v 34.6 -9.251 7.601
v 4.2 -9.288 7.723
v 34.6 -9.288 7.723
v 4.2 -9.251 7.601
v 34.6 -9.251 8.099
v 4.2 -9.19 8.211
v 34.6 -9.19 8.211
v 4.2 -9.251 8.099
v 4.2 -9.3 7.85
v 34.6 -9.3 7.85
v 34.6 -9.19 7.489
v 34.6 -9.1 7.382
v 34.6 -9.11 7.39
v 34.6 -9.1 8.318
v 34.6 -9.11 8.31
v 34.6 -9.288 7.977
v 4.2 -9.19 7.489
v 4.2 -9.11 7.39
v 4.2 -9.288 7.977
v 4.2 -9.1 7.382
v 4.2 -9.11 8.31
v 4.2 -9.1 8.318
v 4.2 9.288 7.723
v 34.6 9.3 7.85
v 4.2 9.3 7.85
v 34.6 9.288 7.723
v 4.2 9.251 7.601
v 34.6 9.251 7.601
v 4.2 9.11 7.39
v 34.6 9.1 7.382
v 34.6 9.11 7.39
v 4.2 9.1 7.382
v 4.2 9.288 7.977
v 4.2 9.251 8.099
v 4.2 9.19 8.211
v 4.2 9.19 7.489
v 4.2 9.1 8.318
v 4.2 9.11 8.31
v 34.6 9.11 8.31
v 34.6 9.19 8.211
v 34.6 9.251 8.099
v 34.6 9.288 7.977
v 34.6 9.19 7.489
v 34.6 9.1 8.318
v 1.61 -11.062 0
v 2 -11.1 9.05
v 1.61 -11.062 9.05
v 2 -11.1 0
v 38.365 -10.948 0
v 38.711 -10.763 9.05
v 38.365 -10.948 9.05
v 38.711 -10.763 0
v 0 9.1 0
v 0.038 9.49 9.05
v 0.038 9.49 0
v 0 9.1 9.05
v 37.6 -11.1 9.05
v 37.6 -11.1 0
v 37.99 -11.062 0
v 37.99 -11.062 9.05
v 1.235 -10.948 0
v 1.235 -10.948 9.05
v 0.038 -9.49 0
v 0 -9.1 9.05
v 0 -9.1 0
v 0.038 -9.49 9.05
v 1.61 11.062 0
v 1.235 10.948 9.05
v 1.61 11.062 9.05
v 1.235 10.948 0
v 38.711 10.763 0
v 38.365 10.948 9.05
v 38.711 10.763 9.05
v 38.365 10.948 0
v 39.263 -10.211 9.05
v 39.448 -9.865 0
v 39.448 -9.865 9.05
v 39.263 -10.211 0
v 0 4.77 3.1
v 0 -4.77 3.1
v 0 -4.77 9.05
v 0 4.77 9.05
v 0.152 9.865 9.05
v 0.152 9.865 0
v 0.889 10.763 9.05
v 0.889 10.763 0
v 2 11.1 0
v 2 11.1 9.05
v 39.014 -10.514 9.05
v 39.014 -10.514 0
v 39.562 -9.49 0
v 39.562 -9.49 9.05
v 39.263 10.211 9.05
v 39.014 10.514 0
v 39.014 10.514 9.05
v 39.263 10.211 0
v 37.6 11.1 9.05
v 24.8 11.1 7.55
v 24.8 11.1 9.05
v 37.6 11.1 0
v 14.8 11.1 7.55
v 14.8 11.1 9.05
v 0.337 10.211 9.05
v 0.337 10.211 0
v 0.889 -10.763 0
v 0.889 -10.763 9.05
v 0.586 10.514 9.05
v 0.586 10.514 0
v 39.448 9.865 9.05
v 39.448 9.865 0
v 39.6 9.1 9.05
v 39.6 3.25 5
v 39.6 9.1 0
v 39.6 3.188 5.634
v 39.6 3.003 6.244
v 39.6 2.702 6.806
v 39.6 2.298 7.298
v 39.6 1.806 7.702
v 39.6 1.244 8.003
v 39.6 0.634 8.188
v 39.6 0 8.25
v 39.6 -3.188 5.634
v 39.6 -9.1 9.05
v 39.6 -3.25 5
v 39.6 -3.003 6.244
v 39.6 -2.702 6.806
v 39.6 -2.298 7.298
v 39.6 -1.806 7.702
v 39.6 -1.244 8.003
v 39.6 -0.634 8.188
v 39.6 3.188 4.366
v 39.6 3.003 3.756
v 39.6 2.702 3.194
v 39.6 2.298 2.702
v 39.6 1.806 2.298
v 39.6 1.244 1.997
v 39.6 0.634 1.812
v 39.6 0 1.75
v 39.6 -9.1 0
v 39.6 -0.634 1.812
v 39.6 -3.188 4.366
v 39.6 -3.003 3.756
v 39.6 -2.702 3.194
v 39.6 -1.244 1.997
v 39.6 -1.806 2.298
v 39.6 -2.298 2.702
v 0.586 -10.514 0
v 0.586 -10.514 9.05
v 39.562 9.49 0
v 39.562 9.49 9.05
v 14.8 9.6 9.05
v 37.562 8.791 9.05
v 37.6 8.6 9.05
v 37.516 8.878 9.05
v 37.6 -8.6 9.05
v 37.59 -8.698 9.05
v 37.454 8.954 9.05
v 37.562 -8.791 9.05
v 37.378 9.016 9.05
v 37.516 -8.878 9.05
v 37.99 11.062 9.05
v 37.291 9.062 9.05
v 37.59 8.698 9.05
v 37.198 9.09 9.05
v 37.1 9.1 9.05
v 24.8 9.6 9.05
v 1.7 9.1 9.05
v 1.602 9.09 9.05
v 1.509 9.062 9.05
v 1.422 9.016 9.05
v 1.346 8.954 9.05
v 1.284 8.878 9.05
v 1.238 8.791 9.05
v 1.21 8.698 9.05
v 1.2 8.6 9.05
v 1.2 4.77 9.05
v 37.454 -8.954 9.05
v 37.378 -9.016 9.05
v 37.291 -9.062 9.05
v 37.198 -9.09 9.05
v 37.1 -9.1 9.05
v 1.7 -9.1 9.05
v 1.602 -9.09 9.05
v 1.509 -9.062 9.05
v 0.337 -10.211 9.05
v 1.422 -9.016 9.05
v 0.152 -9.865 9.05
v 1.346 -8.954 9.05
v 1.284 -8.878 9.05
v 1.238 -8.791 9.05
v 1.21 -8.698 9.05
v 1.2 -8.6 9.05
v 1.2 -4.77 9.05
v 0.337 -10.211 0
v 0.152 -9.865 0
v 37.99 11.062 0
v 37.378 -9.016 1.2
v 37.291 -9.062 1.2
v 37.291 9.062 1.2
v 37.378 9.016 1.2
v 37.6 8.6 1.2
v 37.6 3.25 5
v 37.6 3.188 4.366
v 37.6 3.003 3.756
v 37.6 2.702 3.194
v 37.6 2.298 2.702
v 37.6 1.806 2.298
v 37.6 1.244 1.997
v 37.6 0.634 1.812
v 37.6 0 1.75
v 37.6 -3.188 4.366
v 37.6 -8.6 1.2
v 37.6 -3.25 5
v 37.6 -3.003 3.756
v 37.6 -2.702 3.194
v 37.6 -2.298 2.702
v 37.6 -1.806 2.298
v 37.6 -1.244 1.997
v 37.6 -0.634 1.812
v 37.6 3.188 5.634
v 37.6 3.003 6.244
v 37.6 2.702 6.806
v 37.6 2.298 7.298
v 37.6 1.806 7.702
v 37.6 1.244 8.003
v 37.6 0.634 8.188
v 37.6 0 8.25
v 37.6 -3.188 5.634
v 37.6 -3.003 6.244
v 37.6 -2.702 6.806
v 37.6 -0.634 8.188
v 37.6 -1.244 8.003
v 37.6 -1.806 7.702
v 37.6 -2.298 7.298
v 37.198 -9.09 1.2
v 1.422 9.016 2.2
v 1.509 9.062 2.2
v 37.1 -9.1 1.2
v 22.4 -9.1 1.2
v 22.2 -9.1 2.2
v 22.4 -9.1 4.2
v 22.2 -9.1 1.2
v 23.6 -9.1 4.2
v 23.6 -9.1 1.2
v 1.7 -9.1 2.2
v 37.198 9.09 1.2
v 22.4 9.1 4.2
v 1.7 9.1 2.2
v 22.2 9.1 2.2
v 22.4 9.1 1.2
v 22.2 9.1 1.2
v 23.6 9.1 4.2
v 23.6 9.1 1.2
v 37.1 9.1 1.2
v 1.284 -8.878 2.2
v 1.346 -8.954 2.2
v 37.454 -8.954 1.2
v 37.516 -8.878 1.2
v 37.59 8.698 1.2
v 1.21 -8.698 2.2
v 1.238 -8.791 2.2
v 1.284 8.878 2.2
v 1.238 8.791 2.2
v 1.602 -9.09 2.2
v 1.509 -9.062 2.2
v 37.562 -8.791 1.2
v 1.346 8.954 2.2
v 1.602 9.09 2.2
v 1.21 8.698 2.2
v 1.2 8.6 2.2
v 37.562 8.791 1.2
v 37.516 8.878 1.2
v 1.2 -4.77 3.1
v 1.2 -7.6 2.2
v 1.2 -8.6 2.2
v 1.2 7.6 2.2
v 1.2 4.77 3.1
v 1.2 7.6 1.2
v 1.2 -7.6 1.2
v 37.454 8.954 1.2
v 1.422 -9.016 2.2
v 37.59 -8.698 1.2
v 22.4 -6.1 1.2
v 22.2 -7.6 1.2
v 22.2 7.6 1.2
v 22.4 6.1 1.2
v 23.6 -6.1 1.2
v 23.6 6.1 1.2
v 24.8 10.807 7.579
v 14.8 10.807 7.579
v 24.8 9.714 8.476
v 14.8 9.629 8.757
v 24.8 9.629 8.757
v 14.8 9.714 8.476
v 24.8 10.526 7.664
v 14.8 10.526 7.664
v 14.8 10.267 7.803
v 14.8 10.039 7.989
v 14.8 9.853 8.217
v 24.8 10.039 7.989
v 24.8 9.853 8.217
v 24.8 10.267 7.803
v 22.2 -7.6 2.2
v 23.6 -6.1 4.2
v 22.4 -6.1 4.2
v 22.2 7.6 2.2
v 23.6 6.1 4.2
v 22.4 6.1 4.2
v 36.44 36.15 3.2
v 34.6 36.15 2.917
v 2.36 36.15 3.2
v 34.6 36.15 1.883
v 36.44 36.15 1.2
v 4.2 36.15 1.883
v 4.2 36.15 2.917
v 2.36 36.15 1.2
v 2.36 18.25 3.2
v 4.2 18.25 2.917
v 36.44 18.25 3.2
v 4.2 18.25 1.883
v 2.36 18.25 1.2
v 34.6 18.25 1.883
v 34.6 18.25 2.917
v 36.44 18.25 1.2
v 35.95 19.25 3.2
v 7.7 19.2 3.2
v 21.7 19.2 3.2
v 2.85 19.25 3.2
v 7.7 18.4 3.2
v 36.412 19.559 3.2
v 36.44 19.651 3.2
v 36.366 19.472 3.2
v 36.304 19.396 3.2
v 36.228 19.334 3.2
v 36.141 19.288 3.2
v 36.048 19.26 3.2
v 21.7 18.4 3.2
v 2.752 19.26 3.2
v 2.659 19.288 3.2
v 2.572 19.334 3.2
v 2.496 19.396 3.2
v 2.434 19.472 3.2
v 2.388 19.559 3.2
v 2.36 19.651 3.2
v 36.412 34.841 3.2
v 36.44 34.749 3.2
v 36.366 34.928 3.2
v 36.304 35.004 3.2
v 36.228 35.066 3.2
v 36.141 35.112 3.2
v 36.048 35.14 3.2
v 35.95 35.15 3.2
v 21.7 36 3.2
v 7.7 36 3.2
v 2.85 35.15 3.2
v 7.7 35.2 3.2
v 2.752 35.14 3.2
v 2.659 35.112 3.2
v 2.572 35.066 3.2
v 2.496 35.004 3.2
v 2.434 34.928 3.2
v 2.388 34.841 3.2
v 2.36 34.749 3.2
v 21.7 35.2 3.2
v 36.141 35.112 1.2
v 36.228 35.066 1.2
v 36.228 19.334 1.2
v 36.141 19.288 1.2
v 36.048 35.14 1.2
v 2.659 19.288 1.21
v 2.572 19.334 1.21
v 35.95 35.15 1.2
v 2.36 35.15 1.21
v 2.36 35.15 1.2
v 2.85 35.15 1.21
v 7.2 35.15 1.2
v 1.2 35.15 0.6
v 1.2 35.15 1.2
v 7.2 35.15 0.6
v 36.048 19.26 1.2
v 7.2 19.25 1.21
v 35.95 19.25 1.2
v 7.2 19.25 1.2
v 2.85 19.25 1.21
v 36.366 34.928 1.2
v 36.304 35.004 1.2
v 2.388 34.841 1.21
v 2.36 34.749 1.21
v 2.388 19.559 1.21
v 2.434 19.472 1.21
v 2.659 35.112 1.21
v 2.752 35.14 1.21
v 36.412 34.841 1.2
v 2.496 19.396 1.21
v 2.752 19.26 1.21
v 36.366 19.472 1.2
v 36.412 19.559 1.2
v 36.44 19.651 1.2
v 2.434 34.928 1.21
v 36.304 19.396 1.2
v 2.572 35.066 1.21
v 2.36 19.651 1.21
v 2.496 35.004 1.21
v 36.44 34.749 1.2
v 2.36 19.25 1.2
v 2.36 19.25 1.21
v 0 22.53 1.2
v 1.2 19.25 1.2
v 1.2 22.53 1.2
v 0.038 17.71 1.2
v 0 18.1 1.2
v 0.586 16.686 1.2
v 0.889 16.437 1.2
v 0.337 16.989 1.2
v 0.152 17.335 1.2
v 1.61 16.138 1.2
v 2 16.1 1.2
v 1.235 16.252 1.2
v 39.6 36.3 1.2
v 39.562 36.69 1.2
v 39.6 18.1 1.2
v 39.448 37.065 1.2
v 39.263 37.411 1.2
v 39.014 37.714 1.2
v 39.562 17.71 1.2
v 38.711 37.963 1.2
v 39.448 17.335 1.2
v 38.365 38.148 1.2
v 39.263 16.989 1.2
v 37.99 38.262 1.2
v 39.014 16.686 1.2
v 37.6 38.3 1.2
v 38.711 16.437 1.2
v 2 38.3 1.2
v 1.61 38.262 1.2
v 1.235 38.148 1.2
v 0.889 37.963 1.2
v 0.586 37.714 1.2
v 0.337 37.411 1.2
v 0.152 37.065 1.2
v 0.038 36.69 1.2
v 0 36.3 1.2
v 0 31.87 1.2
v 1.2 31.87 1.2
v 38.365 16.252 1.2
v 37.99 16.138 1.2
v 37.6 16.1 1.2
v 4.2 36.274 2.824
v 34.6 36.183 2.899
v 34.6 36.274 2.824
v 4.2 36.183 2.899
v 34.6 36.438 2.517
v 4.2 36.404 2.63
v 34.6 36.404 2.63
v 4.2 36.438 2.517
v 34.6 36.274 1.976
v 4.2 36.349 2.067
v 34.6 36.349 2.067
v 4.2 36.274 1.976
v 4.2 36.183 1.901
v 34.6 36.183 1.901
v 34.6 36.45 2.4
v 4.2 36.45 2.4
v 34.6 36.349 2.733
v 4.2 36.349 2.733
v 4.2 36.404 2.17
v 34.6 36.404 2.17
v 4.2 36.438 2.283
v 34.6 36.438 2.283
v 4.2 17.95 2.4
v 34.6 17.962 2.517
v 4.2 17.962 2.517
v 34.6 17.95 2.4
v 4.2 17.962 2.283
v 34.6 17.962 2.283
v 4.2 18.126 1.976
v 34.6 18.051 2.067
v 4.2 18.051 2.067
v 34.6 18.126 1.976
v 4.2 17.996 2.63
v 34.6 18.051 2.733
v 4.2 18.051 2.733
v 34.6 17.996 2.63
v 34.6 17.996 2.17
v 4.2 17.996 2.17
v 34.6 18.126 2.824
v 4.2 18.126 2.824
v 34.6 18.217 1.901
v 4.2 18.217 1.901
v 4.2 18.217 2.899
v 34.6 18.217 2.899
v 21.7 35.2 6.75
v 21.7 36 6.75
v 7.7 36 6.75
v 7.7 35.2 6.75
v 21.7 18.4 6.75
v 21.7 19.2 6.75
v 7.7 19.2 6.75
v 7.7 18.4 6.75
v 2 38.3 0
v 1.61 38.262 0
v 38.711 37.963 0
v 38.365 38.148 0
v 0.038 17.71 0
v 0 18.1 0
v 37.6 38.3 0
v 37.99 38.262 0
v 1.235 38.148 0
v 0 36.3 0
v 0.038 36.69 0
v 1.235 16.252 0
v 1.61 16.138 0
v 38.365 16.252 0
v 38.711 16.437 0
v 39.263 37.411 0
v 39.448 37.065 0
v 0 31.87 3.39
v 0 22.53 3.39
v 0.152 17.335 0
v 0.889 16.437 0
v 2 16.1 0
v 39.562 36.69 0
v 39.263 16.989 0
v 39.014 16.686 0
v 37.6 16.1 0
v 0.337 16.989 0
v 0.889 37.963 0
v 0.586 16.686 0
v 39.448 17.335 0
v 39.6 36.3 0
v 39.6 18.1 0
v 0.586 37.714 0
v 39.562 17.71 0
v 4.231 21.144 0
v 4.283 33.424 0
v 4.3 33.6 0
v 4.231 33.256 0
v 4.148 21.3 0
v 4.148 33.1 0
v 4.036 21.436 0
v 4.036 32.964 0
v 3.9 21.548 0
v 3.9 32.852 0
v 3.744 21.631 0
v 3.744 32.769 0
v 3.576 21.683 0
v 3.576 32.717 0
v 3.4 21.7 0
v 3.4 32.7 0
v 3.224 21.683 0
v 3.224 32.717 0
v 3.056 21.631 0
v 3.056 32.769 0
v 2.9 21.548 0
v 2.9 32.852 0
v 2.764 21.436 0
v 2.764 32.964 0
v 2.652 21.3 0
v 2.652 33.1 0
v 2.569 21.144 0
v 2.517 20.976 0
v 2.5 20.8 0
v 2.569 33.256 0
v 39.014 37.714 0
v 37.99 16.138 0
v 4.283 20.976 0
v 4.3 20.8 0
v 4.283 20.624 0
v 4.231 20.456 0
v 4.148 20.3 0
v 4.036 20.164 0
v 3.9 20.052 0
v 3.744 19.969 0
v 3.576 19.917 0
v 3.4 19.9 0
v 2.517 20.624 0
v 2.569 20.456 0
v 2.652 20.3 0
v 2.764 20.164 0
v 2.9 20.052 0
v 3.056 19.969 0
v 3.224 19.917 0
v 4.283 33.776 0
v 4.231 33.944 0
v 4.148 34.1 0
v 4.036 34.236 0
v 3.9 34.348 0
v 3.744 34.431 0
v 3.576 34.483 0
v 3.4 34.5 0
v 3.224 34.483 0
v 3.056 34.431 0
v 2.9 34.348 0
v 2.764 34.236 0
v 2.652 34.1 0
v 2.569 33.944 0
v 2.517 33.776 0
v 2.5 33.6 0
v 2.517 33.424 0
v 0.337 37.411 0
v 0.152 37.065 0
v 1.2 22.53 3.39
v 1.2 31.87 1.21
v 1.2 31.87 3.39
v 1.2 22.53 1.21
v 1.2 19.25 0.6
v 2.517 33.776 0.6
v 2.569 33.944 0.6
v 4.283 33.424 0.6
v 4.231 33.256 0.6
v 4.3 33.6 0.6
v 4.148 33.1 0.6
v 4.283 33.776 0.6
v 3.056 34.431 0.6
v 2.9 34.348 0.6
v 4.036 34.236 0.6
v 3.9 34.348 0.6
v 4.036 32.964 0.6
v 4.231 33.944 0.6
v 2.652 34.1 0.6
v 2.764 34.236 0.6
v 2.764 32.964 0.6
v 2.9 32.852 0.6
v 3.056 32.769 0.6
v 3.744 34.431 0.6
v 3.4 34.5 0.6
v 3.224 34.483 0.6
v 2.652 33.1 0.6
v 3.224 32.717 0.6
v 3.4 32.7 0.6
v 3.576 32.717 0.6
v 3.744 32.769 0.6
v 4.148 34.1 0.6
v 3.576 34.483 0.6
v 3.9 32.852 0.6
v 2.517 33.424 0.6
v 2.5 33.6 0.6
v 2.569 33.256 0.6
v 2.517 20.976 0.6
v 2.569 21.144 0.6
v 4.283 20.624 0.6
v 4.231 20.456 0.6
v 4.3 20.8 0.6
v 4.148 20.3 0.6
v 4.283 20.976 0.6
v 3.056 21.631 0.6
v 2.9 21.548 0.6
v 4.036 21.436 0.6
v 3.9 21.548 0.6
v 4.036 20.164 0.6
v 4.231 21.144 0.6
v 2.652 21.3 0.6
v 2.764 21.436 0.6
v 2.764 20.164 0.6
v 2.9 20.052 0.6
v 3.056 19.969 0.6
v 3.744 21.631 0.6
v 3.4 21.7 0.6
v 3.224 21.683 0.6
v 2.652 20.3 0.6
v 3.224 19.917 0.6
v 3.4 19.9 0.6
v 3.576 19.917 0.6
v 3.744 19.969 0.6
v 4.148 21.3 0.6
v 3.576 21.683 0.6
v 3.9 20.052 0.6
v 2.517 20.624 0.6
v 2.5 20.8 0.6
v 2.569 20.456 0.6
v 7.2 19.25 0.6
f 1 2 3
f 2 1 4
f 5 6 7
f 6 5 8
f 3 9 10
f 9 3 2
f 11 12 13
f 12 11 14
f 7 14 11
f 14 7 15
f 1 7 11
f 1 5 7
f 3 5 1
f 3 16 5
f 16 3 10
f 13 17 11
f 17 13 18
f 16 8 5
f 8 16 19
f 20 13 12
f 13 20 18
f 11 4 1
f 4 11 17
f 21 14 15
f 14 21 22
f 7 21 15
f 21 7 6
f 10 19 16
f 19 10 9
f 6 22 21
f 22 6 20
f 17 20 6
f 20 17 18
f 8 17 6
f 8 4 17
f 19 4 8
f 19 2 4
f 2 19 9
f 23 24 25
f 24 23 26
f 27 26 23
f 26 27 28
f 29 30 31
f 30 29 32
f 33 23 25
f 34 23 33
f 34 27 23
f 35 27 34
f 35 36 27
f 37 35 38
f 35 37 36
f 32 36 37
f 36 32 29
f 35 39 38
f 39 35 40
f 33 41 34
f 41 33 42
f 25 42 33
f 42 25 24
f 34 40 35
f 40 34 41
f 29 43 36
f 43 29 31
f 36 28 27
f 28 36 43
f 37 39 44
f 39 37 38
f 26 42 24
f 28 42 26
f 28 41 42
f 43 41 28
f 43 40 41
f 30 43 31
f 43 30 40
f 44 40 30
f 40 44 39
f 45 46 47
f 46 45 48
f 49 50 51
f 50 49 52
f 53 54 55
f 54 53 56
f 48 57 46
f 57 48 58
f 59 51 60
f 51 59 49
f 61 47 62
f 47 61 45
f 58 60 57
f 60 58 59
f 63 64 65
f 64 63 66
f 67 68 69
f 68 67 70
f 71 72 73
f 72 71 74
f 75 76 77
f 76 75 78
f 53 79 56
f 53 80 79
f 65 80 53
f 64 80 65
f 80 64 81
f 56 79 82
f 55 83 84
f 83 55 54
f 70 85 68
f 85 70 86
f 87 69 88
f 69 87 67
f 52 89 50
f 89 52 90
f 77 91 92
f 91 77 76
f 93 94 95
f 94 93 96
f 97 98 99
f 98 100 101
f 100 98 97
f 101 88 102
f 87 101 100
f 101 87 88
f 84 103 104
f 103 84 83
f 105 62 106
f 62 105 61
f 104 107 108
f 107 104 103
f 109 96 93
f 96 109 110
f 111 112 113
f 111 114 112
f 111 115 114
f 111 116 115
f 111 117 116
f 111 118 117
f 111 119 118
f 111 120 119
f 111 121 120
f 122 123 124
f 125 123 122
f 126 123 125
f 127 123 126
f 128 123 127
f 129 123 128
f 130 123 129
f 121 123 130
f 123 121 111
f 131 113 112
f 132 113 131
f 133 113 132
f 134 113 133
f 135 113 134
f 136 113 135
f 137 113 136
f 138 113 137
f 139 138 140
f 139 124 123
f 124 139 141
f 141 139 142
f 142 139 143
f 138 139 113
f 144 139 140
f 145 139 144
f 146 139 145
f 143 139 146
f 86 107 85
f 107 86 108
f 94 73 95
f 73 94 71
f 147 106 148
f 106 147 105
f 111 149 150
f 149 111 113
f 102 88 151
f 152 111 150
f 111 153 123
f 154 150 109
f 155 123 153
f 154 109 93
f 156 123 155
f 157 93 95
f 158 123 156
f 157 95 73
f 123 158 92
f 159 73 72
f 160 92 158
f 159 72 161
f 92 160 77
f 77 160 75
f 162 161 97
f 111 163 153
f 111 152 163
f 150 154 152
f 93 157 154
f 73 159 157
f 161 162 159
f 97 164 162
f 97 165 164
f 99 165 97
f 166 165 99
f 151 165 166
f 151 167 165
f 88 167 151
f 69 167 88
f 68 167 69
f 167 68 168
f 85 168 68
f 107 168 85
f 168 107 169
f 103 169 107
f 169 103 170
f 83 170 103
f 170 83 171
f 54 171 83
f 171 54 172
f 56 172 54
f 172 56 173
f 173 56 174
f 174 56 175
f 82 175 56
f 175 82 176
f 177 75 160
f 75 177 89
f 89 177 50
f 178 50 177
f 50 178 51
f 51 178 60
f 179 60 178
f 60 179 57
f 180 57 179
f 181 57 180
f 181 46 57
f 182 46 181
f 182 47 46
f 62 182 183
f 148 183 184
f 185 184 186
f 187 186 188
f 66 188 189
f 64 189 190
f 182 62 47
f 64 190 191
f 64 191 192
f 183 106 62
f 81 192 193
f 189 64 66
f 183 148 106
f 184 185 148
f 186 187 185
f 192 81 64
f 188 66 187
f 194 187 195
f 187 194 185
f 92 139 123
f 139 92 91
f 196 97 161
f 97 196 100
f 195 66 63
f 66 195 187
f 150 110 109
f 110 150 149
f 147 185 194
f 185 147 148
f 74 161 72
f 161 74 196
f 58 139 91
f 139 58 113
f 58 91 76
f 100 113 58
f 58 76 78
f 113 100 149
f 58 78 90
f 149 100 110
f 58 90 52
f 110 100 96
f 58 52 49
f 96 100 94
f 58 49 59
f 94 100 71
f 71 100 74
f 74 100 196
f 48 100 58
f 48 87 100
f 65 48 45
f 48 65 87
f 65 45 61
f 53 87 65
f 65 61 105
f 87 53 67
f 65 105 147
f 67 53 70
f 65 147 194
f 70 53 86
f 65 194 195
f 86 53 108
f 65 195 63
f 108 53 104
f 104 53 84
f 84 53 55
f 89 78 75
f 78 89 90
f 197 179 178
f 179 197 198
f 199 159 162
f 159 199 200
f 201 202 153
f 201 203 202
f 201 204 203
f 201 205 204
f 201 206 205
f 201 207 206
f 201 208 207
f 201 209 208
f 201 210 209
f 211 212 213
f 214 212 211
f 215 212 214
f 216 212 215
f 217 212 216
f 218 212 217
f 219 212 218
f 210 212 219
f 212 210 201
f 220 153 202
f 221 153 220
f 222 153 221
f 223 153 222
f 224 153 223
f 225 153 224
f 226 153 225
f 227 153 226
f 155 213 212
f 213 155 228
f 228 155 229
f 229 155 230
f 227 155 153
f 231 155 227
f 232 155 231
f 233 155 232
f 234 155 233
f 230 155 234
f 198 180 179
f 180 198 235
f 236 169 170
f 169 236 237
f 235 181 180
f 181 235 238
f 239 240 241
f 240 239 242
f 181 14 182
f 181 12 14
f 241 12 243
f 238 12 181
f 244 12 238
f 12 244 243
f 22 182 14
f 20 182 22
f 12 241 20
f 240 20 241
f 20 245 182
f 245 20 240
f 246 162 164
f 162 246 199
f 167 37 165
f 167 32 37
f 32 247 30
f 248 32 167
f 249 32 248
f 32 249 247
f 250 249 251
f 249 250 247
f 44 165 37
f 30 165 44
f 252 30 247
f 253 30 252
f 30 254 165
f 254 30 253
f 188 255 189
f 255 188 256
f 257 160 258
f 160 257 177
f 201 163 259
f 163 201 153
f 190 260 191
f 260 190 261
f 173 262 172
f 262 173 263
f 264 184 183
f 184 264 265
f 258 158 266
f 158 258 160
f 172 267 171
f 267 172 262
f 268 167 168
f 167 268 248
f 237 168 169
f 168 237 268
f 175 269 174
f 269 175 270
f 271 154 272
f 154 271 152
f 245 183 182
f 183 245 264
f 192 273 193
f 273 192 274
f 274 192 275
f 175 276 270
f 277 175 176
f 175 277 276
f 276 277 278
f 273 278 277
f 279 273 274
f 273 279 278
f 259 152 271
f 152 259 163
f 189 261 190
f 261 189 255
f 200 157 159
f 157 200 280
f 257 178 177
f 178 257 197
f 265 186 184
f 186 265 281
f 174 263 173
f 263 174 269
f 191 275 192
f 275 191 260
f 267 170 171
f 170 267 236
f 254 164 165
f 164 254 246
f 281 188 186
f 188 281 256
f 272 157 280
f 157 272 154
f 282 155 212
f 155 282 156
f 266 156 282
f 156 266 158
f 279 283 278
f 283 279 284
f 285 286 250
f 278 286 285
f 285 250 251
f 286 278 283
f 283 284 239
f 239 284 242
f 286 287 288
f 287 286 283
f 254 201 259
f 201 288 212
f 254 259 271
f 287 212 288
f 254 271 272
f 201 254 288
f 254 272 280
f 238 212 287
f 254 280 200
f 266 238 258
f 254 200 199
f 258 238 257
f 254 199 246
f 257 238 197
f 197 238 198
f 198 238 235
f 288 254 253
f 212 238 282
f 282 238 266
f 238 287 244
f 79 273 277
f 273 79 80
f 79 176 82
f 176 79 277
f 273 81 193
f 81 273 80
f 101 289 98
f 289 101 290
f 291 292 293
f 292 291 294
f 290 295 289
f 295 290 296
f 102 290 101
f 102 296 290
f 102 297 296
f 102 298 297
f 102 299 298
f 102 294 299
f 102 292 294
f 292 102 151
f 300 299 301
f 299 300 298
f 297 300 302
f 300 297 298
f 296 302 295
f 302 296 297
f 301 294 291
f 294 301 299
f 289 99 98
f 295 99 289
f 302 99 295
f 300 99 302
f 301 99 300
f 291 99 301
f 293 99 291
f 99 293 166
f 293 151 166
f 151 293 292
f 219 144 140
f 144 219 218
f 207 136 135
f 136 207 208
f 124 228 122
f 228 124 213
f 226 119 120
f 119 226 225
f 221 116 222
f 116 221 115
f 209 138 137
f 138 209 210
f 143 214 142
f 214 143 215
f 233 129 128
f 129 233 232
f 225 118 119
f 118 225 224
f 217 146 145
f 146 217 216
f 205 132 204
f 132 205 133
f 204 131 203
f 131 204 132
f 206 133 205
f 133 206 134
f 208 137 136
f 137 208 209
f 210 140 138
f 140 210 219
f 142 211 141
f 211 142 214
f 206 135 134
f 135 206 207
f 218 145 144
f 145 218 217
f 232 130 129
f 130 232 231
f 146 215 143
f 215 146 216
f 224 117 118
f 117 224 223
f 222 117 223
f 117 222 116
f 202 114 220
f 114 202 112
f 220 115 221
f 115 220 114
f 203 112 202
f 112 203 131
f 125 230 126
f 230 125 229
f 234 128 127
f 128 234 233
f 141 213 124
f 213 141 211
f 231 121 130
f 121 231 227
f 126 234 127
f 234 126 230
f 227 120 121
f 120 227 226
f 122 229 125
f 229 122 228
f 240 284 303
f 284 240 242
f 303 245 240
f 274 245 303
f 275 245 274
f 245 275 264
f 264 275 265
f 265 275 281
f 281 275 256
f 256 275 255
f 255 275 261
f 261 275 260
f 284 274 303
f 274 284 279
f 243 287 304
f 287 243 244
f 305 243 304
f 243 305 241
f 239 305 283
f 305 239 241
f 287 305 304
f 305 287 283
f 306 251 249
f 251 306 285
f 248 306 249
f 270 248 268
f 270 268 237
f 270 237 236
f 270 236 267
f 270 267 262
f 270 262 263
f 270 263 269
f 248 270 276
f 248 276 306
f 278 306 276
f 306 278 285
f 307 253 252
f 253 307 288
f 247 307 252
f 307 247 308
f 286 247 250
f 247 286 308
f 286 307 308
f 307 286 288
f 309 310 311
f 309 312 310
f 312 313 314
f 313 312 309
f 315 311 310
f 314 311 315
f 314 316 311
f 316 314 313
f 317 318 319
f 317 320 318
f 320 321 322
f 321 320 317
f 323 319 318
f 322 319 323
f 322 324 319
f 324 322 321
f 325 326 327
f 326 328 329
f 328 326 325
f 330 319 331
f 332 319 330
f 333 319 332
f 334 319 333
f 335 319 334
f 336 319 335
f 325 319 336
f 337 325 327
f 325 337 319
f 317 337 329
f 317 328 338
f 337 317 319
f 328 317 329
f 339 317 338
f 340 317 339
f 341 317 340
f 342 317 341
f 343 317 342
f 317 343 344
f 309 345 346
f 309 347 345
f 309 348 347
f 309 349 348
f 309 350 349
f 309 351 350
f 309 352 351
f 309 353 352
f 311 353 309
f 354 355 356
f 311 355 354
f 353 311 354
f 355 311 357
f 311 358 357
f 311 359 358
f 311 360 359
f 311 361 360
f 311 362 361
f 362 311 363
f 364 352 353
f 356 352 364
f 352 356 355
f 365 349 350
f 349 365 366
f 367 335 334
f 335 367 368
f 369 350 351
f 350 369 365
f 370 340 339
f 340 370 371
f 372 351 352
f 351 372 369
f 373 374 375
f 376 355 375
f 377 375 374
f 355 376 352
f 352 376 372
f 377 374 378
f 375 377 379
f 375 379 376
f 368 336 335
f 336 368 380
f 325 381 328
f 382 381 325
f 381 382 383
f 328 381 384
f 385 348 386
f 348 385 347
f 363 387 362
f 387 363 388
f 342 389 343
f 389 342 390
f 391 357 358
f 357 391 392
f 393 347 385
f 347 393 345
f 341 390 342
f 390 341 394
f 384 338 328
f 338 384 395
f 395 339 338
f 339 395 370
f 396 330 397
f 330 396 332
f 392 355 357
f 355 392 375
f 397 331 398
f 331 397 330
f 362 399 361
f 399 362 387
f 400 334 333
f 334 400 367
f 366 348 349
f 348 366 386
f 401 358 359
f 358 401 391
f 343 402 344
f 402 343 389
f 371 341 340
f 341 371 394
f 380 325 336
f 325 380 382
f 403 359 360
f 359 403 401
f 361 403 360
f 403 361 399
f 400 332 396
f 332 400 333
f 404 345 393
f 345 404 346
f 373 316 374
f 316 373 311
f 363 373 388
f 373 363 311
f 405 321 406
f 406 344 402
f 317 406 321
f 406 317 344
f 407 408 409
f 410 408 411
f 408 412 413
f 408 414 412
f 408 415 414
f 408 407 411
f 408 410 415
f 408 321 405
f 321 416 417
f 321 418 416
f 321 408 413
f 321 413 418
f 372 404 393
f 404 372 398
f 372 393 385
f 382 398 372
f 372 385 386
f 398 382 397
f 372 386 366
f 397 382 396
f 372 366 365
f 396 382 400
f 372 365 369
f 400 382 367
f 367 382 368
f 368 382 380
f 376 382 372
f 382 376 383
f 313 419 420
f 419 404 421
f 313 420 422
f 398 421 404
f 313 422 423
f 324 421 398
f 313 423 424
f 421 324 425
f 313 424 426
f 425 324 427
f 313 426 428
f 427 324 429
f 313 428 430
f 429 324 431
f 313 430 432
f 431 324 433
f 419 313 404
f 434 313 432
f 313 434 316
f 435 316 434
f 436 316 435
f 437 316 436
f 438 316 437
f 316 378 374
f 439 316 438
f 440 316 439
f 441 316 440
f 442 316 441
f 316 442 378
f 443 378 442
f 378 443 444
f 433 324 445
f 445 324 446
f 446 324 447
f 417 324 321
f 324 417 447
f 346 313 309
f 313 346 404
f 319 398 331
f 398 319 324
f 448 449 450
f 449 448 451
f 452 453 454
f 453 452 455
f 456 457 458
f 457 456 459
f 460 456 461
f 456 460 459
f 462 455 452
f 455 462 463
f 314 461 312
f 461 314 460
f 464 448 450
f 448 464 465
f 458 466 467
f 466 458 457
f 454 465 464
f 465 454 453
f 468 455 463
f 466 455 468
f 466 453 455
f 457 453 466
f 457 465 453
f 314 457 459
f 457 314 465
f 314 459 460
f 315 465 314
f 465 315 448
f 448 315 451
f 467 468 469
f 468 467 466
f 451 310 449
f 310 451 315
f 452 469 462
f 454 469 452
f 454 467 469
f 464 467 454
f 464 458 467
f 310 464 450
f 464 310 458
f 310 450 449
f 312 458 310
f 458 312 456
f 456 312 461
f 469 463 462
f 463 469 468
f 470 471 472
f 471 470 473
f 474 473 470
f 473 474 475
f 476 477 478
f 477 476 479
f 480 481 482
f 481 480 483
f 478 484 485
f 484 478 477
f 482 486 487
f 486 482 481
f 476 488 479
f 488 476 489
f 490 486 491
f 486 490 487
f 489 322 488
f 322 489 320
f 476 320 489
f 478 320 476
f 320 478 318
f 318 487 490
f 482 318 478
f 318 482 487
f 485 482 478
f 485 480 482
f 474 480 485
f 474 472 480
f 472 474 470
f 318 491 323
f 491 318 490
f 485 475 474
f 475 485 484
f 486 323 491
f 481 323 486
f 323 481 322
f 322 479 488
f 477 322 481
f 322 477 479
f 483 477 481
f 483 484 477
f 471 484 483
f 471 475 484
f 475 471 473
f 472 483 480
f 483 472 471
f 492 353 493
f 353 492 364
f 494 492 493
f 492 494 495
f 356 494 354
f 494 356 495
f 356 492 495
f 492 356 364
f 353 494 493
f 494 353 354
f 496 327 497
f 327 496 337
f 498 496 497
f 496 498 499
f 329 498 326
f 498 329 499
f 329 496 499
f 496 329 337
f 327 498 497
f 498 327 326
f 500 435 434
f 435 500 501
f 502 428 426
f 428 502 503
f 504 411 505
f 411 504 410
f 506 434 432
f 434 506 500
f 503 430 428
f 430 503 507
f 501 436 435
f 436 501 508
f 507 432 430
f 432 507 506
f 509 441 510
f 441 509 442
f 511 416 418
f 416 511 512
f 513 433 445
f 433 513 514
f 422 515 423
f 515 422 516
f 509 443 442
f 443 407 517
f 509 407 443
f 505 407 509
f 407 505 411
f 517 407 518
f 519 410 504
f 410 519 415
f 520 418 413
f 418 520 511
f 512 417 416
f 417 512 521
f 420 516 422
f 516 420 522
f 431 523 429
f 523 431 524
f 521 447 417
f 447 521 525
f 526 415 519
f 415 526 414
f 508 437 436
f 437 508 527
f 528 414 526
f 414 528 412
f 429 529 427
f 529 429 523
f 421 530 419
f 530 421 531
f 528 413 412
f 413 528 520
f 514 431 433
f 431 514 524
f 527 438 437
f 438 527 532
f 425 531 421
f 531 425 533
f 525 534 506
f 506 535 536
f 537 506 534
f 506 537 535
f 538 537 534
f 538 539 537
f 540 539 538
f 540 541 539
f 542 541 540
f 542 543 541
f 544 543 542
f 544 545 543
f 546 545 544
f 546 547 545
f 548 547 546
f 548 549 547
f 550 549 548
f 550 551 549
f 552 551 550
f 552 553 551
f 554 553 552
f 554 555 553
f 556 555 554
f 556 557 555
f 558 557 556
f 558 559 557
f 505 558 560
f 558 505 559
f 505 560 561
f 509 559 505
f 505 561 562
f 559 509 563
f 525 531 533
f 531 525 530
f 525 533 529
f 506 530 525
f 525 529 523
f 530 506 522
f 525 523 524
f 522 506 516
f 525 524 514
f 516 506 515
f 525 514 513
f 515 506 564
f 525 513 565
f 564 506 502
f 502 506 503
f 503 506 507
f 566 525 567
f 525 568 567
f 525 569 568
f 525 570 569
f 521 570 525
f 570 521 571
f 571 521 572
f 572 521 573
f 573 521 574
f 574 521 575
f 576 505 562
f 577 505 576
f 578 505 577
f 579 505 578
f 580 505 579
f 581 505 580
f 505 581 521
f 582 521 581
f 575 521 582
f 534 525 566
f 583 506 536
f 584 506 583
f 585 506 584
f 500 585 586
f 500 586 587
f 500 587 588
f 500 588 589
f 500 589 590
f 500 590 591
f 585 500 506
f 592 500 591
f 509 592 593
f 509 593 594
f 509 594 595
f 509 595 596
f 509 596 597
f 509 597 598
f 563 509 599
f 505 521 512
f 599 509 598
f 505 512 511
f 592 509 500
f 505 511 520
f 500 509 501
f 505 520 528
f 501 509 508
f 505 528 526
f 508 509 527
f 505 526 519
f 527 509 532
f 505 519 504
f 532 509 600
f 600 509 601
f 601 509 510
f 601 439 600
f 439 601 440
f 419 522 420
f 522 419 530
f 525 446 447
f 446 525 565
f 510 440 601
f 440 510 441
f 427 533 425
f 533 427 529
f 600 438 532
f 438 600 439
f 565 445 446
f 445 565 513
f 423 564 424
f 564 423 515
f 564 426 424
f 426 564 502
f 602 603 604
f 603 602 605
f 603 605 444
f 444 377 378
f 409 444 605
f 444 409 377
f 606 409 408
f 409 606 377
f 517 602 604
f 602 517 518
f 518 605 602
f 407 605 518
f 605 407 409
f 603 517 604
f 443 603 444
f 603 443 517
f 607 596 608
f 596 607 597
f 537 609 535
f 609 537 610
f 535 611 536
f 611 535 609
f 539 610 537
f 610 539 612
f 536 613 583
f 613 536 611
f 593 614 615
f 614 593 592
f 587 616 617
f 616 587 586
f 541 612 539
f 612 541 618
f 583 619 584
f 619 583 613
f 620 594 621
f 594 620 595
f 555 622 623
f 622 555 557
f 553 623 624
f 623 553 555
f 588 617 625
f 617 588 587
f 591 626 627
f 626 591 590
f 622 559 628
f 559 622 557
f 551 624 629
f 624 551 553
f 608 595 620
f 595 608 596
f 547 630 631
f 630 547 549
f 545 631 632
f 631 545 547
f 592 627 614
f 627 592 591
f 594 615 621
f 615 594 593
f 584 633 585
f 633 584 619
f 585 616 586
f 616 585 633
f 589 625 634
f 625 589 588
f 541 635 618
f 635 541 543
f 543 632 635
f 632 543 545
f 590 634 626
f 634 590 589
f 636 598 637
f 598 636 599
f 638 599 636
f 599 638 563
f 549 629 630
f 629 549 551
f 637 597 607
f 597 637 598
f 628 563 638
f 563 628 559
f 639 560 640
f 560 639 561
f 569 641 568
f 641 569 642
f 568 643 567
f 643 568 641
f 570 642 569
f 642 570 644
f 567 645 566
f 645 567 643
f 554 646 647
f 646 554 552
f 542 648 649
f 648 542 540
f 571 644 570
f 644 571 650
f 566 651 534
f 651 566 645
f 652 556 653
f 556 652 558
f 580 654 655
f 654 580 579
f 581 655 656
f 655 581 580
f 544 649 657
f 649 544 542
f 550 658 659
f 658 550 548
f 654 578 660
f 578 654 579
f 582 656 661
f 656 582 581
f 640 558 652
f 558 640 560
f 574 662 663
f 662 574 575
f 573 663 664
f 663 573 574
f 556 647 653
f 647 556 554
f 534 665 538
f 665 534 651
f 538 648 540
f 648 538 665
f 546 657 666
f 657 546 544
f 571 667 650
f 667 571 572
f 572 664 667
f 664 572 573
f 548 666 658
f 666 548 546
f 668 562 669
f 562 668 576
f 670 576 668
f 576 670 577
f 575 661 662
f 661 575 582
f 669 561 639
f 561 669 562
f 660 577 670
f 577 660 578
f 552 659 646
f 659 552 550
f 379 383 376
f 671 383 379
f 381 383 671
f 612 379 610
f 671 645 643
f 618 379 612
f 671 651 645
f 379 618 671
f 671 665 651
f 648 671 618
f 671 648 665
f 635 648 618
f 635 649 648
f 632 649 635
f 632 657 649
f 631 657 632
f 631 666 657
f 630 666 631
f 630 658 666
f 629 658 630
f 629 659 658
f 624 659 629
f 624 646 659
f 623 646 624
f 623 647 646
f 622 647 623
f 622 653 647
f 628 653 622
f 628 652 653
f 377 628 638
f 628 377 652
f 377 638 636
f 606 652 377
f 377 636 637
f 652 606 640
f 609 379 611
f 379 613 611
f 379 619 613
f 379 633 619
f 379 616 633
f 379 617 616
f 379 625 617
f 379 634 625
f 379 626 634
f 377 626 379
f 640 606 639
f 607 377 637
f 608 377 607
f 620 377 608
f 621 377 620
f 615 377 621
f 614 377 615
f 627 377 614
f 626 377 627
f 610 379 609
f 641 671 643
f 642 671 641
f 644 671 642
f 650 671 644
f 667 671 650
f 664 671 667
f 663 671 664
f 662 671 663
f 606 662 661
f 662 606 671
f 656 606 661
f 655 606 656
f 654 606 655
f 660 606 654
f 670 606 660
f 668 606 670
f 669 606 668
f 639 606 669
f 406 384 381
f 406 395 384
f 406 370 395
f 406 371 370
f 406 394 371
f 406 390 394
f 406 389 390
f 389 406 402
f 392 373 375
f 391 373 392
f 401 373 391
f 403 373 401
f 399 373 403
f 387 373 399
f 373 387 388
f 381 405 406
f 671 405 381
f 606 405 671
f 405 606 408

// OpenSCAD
// SPDX-License-Identifier: AGPL-3.0-or-later
// Board-only "snap" version of the XIAO ESP32S3 case with an RP-SMA bulkhead for an external antenna.
// Same geometry and parameters as xiao-esp32s3-case.scad: edit them there, all versions stay in step.

include <xiao-esp32s3-case.scad>
style = "snap";
antenna = false;
sma = true;
